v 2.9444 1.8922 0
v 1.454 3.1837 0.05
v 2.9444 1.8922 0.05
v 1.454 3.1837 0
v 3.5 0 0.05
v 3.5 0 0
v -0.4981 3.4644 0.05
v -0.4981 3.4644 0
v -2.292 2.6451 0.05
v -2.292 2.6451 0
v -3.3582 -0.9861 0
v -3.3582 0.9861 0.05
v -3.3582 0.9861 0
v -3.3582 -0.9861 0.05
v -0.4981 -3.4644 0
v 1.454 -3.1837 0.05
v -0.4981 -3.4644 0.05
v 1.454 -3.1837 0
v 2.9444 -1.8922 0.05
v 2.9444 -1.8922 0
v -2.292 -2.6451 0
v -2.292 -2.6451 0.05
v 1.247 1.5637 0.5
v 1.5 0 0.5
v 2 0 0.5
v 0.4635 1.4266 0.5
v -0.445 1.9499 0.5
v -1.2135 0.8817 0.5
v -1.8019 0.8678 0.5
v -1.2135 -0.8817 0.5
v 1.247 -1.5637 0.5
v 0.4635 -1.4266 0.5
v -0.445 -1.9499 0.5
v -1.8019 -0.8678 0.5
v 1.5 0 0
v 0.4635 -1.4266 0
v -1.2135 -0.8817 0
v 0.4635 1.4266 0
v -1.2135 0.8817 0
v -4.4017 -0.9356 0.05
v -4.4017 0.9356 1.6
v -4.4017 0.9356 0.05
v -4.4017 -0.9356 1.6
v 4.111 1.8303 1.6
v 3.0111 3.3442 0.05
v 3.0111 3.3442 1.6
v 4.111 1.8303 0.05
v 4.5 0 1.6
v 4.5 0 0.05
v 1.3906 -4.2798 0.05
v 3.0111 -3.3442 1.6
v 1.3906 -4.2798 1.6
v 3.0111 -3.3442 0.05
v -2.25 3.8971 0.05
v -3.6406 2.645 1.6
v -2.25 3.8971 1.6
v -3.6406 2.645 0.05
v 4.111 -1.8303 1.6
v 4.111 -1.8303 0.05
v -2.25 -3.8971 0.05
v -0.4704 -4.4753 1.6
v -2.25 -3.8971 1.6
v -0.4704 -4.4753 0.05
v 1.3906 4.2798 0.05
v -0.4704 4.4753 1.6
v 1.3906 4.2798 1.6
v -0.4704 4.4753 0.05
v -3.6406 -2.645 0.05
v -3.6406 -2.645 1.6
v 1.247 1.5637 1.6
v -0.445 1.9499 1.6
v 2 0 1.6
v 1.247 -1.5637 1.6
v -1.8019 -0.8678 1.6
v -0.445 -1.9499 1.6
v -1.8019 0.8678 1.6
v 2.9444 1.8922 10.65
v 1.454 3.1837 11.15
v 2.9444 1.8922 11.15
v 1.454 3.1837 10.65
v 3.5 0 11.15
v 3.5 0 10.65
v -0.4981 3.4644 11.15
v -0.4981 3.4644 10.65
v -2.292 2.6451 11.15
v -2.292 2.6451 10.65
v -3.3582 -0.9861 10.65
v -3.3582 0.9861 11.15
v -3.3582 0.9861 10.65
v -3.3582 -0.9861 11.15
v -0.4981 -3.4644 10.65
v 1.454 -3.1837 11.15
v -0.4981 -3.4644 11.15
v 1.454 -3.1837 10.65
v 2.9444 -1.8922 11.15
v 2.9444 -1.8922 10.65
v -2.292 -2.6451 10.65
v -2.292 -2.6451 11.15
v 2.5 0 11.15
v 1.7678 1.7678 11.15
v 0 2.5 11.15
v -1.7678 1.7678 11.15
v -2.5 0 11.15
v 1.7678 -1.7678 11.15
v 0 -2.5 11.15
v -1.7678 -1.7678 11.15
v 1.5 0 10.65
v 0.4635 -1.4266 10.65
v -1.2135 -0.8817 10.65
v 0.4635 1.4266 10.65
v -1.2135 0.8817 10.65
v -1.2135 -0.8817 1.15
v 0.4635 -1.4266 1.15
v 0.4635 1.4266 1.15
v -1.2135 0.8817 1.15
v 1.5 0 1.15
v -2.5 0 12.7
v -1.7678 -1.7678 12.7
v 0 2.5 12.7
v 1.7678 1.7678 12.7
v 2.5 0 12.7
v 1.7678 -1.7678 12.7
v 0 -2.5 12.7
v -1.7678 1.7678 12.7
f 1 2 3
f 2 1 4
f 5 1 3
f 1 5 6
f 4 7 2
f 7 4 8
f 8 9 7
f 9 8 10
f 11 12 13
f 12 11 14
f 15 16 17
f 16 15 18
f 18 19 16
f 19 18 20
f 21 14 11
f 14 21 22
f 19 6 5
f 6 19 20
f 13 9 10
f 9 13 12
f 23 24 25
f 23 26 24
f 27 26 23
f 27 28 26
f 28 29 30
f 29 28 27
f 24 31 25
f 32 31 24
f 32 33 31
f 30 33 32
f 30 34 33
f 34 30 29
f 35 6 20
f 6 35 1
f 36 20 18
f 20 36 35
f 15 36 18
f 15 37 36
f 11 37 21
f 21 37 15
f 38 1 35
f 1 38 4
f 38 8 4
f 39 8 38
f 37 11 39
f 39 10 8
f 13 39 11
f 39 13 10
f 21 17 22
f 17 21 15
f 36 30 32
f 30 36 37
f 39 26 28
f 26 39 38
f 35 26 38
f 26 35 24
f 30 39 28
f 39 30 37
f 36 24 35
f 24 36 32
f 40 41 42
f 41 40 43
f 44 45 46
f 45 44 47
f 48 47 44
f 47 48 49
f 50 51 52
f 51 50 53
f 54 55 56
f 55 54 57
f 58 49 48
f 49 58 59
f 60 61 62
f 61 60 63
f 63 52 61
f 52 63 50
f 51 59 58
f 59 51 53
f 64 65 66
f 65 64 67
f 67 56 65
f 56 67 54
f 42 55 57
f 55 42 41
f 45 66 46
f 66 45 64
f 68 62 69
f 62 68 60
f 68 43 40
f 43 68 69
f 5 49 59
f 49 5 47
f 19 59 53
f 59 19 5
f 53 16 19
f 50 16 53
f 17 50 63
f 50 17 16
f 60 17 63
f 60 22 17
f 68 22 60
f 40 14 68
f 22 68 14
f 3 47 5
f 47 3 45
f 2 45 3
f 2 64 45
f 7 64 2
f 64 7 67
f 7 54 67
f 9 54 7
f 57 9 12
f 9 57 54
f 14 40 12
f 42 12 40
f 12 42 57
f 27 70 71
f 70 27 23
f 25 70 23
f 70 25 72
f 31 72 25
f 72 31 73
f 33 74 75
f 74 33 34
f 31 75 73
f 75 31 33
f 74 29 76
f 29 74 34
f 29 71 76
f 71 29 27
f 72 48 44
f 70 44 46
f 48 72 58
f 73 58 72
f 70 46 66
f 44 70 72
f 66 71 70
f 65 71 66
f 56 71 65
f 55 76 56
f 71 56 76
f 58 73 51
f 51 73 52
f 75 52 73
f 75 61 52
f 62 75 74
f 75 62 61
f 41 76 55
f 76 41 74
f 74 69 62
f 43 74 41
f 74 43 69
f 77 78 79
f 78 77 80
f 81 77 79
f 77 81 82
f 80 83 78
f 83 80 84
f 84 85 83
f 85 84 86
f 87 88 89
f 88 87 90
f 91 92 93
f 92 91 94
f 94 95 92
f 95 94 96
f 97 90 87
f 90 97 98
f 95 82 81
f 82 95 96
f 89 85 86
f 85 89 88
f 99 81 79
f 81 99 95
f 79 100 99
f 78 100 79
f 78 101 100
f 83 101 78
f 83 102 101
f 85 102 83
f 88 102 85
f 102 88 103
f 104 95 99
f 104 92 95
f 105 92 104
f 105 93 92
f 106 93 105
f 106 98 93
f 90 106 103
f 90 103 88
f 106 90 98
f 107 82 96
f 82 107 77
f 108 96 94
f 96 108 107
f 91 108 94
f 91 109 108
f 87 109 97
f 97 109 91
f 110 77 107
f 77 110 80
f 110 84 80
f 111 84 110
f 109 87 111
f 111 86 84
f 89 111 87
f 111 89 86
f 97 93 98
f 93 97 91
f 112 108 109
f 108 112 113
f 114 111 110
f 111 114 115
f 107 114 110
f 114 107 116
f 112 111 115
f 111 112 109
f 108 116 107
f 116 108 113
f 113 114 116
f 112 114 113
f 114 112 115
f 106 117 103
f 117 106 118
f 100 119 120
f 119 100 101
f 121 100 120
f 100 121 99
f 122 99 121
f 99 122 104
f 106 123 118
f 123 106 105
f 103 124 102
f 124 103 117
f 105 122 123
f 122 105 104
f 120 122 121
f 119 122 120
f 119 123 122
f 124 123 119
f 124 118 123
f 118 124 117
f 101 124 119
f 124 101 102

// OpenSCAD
// Parameters (original)
inner_diameter = 3; //[1.5:6:0.1]
outer_diameter = 7; //[3.5:14:0.1]
thickness = 0.5; //[0.25:1:0.05]
inner_radius = 1.5; //[0.75:3:0.05]
outer_radius = 3.5; //[1.75:7:0.05]
hole_clearance = 0; //[-0.2:0.5:0.05]

// Connectivity overlap (1–2mm required)
overlap = 1.0;

// --- Parts ---

// Flat washer (MISSING PART fixed: explicit washer module kept and used)
module washer(h=thickness) {
  difference() {
    cylinder(r=outer_radius, h=h, center=false);
    translate([0,0,-1]) cylinder(r=inner_radius + hole_clearance, h=h + 2, center=false);
  }
}

module round_grommet_assembly(h=thickness+1) {
  // Outer grommet body
  difference() {
    cylinder(r=outer_radius + 1, h=h, center=false);
    translate([0,0,-1]) cylinder(r=inner_radius + 0.5, h=h + 2, center=false);
  }
}

module round_grommet_top(h=thickness) {
  // Top cap / flange
  difference() {
    cylinder(r=outer_radius + 1, h=h, center=false);
    translate([0,0,-1]) cylinder(r=inner_radius + 0.5, h=h + 2, center=false);
  }
}

module screw_body(h=10, r=1.5) {
  cylinder(r=r, h=h, center=false);
}

module nut_body(h=2, r=2.5) {
  cylinder(r=r, h=h, center=false);
}

// --- Assembly: all parts physically intersect and are unioned into one solid ---
module assembly() {

  // Heights
  w_h   = thickness;        // washer thickness
  g_h   = thickness + 1;    // grommet assembly height
  gt_h  = thickness;        // grommet top height
  s_h   = 10;               // screw height
  n_h   = 2;                // nut height

  // Clamp overlap to a safe value for thin parts (still within 1–2mm requirement)
  ov = min(overlap, min(w_h, min(g_h, gt_h)) * 0.9);

  // Z stacking (all parts start at z=0 style; overlaps are created by starting next part early)
  z0 = 0;

  // Base washer
  z_w_base  = z0;

  // Grommet assembly overlaps washer by ov
  z_g_base  = z_w_base + w_h - ov;

  // Top cap overlaps grommet assembly by ov (FIX: cap attached, not floating)
  z_gt_base = z_g_base + g_h - ov;

  // Central post/screw overlaps into top cap by ov (FIX: no gap at top)
  z_s_base  = z_gt_base + gt_h - ov;

  // Nut overlaps screw by ov
  z_n_base  = z_s_base + s_h - ov;

  // Lower washer-like ring (under nut) overlaps nut and screw (FIX: attached, not floating)
  z_w2_base = z_n_base - w_h + ov;

  union() {
    // Base washer (expected part: washer) - attached to grommet via overlap
    color("Silver")
      translate([0,0,z_w_base]) washer(w_h);

    // Grommet assembly
    color("DimGray")
      translate([0,0,z_g_base]) round_grommet_assembly(g_h);

    // Upper flange/cap - attached to grommet via overlap
    color("DimGray")
      translate([0,0,z_gt_base]) round_grommet_top(gt_h);

    // Central cylindrical post - overlaps into cap and down through stack
    color("Black")
      translate([0,0,z_s_base]) screw_body(s_h, 1.5);

    // Lower washer-like ring - overlaps nut and screw (attached)
    color("Black")
      translate([0,0,z_w2_base]) washer(w_h);

    // Nut - overlaps screw
    color("Black")
      translate([0,0,z_n_base]) nut_body(n_h, 2.5);
  }
}

assembly();
